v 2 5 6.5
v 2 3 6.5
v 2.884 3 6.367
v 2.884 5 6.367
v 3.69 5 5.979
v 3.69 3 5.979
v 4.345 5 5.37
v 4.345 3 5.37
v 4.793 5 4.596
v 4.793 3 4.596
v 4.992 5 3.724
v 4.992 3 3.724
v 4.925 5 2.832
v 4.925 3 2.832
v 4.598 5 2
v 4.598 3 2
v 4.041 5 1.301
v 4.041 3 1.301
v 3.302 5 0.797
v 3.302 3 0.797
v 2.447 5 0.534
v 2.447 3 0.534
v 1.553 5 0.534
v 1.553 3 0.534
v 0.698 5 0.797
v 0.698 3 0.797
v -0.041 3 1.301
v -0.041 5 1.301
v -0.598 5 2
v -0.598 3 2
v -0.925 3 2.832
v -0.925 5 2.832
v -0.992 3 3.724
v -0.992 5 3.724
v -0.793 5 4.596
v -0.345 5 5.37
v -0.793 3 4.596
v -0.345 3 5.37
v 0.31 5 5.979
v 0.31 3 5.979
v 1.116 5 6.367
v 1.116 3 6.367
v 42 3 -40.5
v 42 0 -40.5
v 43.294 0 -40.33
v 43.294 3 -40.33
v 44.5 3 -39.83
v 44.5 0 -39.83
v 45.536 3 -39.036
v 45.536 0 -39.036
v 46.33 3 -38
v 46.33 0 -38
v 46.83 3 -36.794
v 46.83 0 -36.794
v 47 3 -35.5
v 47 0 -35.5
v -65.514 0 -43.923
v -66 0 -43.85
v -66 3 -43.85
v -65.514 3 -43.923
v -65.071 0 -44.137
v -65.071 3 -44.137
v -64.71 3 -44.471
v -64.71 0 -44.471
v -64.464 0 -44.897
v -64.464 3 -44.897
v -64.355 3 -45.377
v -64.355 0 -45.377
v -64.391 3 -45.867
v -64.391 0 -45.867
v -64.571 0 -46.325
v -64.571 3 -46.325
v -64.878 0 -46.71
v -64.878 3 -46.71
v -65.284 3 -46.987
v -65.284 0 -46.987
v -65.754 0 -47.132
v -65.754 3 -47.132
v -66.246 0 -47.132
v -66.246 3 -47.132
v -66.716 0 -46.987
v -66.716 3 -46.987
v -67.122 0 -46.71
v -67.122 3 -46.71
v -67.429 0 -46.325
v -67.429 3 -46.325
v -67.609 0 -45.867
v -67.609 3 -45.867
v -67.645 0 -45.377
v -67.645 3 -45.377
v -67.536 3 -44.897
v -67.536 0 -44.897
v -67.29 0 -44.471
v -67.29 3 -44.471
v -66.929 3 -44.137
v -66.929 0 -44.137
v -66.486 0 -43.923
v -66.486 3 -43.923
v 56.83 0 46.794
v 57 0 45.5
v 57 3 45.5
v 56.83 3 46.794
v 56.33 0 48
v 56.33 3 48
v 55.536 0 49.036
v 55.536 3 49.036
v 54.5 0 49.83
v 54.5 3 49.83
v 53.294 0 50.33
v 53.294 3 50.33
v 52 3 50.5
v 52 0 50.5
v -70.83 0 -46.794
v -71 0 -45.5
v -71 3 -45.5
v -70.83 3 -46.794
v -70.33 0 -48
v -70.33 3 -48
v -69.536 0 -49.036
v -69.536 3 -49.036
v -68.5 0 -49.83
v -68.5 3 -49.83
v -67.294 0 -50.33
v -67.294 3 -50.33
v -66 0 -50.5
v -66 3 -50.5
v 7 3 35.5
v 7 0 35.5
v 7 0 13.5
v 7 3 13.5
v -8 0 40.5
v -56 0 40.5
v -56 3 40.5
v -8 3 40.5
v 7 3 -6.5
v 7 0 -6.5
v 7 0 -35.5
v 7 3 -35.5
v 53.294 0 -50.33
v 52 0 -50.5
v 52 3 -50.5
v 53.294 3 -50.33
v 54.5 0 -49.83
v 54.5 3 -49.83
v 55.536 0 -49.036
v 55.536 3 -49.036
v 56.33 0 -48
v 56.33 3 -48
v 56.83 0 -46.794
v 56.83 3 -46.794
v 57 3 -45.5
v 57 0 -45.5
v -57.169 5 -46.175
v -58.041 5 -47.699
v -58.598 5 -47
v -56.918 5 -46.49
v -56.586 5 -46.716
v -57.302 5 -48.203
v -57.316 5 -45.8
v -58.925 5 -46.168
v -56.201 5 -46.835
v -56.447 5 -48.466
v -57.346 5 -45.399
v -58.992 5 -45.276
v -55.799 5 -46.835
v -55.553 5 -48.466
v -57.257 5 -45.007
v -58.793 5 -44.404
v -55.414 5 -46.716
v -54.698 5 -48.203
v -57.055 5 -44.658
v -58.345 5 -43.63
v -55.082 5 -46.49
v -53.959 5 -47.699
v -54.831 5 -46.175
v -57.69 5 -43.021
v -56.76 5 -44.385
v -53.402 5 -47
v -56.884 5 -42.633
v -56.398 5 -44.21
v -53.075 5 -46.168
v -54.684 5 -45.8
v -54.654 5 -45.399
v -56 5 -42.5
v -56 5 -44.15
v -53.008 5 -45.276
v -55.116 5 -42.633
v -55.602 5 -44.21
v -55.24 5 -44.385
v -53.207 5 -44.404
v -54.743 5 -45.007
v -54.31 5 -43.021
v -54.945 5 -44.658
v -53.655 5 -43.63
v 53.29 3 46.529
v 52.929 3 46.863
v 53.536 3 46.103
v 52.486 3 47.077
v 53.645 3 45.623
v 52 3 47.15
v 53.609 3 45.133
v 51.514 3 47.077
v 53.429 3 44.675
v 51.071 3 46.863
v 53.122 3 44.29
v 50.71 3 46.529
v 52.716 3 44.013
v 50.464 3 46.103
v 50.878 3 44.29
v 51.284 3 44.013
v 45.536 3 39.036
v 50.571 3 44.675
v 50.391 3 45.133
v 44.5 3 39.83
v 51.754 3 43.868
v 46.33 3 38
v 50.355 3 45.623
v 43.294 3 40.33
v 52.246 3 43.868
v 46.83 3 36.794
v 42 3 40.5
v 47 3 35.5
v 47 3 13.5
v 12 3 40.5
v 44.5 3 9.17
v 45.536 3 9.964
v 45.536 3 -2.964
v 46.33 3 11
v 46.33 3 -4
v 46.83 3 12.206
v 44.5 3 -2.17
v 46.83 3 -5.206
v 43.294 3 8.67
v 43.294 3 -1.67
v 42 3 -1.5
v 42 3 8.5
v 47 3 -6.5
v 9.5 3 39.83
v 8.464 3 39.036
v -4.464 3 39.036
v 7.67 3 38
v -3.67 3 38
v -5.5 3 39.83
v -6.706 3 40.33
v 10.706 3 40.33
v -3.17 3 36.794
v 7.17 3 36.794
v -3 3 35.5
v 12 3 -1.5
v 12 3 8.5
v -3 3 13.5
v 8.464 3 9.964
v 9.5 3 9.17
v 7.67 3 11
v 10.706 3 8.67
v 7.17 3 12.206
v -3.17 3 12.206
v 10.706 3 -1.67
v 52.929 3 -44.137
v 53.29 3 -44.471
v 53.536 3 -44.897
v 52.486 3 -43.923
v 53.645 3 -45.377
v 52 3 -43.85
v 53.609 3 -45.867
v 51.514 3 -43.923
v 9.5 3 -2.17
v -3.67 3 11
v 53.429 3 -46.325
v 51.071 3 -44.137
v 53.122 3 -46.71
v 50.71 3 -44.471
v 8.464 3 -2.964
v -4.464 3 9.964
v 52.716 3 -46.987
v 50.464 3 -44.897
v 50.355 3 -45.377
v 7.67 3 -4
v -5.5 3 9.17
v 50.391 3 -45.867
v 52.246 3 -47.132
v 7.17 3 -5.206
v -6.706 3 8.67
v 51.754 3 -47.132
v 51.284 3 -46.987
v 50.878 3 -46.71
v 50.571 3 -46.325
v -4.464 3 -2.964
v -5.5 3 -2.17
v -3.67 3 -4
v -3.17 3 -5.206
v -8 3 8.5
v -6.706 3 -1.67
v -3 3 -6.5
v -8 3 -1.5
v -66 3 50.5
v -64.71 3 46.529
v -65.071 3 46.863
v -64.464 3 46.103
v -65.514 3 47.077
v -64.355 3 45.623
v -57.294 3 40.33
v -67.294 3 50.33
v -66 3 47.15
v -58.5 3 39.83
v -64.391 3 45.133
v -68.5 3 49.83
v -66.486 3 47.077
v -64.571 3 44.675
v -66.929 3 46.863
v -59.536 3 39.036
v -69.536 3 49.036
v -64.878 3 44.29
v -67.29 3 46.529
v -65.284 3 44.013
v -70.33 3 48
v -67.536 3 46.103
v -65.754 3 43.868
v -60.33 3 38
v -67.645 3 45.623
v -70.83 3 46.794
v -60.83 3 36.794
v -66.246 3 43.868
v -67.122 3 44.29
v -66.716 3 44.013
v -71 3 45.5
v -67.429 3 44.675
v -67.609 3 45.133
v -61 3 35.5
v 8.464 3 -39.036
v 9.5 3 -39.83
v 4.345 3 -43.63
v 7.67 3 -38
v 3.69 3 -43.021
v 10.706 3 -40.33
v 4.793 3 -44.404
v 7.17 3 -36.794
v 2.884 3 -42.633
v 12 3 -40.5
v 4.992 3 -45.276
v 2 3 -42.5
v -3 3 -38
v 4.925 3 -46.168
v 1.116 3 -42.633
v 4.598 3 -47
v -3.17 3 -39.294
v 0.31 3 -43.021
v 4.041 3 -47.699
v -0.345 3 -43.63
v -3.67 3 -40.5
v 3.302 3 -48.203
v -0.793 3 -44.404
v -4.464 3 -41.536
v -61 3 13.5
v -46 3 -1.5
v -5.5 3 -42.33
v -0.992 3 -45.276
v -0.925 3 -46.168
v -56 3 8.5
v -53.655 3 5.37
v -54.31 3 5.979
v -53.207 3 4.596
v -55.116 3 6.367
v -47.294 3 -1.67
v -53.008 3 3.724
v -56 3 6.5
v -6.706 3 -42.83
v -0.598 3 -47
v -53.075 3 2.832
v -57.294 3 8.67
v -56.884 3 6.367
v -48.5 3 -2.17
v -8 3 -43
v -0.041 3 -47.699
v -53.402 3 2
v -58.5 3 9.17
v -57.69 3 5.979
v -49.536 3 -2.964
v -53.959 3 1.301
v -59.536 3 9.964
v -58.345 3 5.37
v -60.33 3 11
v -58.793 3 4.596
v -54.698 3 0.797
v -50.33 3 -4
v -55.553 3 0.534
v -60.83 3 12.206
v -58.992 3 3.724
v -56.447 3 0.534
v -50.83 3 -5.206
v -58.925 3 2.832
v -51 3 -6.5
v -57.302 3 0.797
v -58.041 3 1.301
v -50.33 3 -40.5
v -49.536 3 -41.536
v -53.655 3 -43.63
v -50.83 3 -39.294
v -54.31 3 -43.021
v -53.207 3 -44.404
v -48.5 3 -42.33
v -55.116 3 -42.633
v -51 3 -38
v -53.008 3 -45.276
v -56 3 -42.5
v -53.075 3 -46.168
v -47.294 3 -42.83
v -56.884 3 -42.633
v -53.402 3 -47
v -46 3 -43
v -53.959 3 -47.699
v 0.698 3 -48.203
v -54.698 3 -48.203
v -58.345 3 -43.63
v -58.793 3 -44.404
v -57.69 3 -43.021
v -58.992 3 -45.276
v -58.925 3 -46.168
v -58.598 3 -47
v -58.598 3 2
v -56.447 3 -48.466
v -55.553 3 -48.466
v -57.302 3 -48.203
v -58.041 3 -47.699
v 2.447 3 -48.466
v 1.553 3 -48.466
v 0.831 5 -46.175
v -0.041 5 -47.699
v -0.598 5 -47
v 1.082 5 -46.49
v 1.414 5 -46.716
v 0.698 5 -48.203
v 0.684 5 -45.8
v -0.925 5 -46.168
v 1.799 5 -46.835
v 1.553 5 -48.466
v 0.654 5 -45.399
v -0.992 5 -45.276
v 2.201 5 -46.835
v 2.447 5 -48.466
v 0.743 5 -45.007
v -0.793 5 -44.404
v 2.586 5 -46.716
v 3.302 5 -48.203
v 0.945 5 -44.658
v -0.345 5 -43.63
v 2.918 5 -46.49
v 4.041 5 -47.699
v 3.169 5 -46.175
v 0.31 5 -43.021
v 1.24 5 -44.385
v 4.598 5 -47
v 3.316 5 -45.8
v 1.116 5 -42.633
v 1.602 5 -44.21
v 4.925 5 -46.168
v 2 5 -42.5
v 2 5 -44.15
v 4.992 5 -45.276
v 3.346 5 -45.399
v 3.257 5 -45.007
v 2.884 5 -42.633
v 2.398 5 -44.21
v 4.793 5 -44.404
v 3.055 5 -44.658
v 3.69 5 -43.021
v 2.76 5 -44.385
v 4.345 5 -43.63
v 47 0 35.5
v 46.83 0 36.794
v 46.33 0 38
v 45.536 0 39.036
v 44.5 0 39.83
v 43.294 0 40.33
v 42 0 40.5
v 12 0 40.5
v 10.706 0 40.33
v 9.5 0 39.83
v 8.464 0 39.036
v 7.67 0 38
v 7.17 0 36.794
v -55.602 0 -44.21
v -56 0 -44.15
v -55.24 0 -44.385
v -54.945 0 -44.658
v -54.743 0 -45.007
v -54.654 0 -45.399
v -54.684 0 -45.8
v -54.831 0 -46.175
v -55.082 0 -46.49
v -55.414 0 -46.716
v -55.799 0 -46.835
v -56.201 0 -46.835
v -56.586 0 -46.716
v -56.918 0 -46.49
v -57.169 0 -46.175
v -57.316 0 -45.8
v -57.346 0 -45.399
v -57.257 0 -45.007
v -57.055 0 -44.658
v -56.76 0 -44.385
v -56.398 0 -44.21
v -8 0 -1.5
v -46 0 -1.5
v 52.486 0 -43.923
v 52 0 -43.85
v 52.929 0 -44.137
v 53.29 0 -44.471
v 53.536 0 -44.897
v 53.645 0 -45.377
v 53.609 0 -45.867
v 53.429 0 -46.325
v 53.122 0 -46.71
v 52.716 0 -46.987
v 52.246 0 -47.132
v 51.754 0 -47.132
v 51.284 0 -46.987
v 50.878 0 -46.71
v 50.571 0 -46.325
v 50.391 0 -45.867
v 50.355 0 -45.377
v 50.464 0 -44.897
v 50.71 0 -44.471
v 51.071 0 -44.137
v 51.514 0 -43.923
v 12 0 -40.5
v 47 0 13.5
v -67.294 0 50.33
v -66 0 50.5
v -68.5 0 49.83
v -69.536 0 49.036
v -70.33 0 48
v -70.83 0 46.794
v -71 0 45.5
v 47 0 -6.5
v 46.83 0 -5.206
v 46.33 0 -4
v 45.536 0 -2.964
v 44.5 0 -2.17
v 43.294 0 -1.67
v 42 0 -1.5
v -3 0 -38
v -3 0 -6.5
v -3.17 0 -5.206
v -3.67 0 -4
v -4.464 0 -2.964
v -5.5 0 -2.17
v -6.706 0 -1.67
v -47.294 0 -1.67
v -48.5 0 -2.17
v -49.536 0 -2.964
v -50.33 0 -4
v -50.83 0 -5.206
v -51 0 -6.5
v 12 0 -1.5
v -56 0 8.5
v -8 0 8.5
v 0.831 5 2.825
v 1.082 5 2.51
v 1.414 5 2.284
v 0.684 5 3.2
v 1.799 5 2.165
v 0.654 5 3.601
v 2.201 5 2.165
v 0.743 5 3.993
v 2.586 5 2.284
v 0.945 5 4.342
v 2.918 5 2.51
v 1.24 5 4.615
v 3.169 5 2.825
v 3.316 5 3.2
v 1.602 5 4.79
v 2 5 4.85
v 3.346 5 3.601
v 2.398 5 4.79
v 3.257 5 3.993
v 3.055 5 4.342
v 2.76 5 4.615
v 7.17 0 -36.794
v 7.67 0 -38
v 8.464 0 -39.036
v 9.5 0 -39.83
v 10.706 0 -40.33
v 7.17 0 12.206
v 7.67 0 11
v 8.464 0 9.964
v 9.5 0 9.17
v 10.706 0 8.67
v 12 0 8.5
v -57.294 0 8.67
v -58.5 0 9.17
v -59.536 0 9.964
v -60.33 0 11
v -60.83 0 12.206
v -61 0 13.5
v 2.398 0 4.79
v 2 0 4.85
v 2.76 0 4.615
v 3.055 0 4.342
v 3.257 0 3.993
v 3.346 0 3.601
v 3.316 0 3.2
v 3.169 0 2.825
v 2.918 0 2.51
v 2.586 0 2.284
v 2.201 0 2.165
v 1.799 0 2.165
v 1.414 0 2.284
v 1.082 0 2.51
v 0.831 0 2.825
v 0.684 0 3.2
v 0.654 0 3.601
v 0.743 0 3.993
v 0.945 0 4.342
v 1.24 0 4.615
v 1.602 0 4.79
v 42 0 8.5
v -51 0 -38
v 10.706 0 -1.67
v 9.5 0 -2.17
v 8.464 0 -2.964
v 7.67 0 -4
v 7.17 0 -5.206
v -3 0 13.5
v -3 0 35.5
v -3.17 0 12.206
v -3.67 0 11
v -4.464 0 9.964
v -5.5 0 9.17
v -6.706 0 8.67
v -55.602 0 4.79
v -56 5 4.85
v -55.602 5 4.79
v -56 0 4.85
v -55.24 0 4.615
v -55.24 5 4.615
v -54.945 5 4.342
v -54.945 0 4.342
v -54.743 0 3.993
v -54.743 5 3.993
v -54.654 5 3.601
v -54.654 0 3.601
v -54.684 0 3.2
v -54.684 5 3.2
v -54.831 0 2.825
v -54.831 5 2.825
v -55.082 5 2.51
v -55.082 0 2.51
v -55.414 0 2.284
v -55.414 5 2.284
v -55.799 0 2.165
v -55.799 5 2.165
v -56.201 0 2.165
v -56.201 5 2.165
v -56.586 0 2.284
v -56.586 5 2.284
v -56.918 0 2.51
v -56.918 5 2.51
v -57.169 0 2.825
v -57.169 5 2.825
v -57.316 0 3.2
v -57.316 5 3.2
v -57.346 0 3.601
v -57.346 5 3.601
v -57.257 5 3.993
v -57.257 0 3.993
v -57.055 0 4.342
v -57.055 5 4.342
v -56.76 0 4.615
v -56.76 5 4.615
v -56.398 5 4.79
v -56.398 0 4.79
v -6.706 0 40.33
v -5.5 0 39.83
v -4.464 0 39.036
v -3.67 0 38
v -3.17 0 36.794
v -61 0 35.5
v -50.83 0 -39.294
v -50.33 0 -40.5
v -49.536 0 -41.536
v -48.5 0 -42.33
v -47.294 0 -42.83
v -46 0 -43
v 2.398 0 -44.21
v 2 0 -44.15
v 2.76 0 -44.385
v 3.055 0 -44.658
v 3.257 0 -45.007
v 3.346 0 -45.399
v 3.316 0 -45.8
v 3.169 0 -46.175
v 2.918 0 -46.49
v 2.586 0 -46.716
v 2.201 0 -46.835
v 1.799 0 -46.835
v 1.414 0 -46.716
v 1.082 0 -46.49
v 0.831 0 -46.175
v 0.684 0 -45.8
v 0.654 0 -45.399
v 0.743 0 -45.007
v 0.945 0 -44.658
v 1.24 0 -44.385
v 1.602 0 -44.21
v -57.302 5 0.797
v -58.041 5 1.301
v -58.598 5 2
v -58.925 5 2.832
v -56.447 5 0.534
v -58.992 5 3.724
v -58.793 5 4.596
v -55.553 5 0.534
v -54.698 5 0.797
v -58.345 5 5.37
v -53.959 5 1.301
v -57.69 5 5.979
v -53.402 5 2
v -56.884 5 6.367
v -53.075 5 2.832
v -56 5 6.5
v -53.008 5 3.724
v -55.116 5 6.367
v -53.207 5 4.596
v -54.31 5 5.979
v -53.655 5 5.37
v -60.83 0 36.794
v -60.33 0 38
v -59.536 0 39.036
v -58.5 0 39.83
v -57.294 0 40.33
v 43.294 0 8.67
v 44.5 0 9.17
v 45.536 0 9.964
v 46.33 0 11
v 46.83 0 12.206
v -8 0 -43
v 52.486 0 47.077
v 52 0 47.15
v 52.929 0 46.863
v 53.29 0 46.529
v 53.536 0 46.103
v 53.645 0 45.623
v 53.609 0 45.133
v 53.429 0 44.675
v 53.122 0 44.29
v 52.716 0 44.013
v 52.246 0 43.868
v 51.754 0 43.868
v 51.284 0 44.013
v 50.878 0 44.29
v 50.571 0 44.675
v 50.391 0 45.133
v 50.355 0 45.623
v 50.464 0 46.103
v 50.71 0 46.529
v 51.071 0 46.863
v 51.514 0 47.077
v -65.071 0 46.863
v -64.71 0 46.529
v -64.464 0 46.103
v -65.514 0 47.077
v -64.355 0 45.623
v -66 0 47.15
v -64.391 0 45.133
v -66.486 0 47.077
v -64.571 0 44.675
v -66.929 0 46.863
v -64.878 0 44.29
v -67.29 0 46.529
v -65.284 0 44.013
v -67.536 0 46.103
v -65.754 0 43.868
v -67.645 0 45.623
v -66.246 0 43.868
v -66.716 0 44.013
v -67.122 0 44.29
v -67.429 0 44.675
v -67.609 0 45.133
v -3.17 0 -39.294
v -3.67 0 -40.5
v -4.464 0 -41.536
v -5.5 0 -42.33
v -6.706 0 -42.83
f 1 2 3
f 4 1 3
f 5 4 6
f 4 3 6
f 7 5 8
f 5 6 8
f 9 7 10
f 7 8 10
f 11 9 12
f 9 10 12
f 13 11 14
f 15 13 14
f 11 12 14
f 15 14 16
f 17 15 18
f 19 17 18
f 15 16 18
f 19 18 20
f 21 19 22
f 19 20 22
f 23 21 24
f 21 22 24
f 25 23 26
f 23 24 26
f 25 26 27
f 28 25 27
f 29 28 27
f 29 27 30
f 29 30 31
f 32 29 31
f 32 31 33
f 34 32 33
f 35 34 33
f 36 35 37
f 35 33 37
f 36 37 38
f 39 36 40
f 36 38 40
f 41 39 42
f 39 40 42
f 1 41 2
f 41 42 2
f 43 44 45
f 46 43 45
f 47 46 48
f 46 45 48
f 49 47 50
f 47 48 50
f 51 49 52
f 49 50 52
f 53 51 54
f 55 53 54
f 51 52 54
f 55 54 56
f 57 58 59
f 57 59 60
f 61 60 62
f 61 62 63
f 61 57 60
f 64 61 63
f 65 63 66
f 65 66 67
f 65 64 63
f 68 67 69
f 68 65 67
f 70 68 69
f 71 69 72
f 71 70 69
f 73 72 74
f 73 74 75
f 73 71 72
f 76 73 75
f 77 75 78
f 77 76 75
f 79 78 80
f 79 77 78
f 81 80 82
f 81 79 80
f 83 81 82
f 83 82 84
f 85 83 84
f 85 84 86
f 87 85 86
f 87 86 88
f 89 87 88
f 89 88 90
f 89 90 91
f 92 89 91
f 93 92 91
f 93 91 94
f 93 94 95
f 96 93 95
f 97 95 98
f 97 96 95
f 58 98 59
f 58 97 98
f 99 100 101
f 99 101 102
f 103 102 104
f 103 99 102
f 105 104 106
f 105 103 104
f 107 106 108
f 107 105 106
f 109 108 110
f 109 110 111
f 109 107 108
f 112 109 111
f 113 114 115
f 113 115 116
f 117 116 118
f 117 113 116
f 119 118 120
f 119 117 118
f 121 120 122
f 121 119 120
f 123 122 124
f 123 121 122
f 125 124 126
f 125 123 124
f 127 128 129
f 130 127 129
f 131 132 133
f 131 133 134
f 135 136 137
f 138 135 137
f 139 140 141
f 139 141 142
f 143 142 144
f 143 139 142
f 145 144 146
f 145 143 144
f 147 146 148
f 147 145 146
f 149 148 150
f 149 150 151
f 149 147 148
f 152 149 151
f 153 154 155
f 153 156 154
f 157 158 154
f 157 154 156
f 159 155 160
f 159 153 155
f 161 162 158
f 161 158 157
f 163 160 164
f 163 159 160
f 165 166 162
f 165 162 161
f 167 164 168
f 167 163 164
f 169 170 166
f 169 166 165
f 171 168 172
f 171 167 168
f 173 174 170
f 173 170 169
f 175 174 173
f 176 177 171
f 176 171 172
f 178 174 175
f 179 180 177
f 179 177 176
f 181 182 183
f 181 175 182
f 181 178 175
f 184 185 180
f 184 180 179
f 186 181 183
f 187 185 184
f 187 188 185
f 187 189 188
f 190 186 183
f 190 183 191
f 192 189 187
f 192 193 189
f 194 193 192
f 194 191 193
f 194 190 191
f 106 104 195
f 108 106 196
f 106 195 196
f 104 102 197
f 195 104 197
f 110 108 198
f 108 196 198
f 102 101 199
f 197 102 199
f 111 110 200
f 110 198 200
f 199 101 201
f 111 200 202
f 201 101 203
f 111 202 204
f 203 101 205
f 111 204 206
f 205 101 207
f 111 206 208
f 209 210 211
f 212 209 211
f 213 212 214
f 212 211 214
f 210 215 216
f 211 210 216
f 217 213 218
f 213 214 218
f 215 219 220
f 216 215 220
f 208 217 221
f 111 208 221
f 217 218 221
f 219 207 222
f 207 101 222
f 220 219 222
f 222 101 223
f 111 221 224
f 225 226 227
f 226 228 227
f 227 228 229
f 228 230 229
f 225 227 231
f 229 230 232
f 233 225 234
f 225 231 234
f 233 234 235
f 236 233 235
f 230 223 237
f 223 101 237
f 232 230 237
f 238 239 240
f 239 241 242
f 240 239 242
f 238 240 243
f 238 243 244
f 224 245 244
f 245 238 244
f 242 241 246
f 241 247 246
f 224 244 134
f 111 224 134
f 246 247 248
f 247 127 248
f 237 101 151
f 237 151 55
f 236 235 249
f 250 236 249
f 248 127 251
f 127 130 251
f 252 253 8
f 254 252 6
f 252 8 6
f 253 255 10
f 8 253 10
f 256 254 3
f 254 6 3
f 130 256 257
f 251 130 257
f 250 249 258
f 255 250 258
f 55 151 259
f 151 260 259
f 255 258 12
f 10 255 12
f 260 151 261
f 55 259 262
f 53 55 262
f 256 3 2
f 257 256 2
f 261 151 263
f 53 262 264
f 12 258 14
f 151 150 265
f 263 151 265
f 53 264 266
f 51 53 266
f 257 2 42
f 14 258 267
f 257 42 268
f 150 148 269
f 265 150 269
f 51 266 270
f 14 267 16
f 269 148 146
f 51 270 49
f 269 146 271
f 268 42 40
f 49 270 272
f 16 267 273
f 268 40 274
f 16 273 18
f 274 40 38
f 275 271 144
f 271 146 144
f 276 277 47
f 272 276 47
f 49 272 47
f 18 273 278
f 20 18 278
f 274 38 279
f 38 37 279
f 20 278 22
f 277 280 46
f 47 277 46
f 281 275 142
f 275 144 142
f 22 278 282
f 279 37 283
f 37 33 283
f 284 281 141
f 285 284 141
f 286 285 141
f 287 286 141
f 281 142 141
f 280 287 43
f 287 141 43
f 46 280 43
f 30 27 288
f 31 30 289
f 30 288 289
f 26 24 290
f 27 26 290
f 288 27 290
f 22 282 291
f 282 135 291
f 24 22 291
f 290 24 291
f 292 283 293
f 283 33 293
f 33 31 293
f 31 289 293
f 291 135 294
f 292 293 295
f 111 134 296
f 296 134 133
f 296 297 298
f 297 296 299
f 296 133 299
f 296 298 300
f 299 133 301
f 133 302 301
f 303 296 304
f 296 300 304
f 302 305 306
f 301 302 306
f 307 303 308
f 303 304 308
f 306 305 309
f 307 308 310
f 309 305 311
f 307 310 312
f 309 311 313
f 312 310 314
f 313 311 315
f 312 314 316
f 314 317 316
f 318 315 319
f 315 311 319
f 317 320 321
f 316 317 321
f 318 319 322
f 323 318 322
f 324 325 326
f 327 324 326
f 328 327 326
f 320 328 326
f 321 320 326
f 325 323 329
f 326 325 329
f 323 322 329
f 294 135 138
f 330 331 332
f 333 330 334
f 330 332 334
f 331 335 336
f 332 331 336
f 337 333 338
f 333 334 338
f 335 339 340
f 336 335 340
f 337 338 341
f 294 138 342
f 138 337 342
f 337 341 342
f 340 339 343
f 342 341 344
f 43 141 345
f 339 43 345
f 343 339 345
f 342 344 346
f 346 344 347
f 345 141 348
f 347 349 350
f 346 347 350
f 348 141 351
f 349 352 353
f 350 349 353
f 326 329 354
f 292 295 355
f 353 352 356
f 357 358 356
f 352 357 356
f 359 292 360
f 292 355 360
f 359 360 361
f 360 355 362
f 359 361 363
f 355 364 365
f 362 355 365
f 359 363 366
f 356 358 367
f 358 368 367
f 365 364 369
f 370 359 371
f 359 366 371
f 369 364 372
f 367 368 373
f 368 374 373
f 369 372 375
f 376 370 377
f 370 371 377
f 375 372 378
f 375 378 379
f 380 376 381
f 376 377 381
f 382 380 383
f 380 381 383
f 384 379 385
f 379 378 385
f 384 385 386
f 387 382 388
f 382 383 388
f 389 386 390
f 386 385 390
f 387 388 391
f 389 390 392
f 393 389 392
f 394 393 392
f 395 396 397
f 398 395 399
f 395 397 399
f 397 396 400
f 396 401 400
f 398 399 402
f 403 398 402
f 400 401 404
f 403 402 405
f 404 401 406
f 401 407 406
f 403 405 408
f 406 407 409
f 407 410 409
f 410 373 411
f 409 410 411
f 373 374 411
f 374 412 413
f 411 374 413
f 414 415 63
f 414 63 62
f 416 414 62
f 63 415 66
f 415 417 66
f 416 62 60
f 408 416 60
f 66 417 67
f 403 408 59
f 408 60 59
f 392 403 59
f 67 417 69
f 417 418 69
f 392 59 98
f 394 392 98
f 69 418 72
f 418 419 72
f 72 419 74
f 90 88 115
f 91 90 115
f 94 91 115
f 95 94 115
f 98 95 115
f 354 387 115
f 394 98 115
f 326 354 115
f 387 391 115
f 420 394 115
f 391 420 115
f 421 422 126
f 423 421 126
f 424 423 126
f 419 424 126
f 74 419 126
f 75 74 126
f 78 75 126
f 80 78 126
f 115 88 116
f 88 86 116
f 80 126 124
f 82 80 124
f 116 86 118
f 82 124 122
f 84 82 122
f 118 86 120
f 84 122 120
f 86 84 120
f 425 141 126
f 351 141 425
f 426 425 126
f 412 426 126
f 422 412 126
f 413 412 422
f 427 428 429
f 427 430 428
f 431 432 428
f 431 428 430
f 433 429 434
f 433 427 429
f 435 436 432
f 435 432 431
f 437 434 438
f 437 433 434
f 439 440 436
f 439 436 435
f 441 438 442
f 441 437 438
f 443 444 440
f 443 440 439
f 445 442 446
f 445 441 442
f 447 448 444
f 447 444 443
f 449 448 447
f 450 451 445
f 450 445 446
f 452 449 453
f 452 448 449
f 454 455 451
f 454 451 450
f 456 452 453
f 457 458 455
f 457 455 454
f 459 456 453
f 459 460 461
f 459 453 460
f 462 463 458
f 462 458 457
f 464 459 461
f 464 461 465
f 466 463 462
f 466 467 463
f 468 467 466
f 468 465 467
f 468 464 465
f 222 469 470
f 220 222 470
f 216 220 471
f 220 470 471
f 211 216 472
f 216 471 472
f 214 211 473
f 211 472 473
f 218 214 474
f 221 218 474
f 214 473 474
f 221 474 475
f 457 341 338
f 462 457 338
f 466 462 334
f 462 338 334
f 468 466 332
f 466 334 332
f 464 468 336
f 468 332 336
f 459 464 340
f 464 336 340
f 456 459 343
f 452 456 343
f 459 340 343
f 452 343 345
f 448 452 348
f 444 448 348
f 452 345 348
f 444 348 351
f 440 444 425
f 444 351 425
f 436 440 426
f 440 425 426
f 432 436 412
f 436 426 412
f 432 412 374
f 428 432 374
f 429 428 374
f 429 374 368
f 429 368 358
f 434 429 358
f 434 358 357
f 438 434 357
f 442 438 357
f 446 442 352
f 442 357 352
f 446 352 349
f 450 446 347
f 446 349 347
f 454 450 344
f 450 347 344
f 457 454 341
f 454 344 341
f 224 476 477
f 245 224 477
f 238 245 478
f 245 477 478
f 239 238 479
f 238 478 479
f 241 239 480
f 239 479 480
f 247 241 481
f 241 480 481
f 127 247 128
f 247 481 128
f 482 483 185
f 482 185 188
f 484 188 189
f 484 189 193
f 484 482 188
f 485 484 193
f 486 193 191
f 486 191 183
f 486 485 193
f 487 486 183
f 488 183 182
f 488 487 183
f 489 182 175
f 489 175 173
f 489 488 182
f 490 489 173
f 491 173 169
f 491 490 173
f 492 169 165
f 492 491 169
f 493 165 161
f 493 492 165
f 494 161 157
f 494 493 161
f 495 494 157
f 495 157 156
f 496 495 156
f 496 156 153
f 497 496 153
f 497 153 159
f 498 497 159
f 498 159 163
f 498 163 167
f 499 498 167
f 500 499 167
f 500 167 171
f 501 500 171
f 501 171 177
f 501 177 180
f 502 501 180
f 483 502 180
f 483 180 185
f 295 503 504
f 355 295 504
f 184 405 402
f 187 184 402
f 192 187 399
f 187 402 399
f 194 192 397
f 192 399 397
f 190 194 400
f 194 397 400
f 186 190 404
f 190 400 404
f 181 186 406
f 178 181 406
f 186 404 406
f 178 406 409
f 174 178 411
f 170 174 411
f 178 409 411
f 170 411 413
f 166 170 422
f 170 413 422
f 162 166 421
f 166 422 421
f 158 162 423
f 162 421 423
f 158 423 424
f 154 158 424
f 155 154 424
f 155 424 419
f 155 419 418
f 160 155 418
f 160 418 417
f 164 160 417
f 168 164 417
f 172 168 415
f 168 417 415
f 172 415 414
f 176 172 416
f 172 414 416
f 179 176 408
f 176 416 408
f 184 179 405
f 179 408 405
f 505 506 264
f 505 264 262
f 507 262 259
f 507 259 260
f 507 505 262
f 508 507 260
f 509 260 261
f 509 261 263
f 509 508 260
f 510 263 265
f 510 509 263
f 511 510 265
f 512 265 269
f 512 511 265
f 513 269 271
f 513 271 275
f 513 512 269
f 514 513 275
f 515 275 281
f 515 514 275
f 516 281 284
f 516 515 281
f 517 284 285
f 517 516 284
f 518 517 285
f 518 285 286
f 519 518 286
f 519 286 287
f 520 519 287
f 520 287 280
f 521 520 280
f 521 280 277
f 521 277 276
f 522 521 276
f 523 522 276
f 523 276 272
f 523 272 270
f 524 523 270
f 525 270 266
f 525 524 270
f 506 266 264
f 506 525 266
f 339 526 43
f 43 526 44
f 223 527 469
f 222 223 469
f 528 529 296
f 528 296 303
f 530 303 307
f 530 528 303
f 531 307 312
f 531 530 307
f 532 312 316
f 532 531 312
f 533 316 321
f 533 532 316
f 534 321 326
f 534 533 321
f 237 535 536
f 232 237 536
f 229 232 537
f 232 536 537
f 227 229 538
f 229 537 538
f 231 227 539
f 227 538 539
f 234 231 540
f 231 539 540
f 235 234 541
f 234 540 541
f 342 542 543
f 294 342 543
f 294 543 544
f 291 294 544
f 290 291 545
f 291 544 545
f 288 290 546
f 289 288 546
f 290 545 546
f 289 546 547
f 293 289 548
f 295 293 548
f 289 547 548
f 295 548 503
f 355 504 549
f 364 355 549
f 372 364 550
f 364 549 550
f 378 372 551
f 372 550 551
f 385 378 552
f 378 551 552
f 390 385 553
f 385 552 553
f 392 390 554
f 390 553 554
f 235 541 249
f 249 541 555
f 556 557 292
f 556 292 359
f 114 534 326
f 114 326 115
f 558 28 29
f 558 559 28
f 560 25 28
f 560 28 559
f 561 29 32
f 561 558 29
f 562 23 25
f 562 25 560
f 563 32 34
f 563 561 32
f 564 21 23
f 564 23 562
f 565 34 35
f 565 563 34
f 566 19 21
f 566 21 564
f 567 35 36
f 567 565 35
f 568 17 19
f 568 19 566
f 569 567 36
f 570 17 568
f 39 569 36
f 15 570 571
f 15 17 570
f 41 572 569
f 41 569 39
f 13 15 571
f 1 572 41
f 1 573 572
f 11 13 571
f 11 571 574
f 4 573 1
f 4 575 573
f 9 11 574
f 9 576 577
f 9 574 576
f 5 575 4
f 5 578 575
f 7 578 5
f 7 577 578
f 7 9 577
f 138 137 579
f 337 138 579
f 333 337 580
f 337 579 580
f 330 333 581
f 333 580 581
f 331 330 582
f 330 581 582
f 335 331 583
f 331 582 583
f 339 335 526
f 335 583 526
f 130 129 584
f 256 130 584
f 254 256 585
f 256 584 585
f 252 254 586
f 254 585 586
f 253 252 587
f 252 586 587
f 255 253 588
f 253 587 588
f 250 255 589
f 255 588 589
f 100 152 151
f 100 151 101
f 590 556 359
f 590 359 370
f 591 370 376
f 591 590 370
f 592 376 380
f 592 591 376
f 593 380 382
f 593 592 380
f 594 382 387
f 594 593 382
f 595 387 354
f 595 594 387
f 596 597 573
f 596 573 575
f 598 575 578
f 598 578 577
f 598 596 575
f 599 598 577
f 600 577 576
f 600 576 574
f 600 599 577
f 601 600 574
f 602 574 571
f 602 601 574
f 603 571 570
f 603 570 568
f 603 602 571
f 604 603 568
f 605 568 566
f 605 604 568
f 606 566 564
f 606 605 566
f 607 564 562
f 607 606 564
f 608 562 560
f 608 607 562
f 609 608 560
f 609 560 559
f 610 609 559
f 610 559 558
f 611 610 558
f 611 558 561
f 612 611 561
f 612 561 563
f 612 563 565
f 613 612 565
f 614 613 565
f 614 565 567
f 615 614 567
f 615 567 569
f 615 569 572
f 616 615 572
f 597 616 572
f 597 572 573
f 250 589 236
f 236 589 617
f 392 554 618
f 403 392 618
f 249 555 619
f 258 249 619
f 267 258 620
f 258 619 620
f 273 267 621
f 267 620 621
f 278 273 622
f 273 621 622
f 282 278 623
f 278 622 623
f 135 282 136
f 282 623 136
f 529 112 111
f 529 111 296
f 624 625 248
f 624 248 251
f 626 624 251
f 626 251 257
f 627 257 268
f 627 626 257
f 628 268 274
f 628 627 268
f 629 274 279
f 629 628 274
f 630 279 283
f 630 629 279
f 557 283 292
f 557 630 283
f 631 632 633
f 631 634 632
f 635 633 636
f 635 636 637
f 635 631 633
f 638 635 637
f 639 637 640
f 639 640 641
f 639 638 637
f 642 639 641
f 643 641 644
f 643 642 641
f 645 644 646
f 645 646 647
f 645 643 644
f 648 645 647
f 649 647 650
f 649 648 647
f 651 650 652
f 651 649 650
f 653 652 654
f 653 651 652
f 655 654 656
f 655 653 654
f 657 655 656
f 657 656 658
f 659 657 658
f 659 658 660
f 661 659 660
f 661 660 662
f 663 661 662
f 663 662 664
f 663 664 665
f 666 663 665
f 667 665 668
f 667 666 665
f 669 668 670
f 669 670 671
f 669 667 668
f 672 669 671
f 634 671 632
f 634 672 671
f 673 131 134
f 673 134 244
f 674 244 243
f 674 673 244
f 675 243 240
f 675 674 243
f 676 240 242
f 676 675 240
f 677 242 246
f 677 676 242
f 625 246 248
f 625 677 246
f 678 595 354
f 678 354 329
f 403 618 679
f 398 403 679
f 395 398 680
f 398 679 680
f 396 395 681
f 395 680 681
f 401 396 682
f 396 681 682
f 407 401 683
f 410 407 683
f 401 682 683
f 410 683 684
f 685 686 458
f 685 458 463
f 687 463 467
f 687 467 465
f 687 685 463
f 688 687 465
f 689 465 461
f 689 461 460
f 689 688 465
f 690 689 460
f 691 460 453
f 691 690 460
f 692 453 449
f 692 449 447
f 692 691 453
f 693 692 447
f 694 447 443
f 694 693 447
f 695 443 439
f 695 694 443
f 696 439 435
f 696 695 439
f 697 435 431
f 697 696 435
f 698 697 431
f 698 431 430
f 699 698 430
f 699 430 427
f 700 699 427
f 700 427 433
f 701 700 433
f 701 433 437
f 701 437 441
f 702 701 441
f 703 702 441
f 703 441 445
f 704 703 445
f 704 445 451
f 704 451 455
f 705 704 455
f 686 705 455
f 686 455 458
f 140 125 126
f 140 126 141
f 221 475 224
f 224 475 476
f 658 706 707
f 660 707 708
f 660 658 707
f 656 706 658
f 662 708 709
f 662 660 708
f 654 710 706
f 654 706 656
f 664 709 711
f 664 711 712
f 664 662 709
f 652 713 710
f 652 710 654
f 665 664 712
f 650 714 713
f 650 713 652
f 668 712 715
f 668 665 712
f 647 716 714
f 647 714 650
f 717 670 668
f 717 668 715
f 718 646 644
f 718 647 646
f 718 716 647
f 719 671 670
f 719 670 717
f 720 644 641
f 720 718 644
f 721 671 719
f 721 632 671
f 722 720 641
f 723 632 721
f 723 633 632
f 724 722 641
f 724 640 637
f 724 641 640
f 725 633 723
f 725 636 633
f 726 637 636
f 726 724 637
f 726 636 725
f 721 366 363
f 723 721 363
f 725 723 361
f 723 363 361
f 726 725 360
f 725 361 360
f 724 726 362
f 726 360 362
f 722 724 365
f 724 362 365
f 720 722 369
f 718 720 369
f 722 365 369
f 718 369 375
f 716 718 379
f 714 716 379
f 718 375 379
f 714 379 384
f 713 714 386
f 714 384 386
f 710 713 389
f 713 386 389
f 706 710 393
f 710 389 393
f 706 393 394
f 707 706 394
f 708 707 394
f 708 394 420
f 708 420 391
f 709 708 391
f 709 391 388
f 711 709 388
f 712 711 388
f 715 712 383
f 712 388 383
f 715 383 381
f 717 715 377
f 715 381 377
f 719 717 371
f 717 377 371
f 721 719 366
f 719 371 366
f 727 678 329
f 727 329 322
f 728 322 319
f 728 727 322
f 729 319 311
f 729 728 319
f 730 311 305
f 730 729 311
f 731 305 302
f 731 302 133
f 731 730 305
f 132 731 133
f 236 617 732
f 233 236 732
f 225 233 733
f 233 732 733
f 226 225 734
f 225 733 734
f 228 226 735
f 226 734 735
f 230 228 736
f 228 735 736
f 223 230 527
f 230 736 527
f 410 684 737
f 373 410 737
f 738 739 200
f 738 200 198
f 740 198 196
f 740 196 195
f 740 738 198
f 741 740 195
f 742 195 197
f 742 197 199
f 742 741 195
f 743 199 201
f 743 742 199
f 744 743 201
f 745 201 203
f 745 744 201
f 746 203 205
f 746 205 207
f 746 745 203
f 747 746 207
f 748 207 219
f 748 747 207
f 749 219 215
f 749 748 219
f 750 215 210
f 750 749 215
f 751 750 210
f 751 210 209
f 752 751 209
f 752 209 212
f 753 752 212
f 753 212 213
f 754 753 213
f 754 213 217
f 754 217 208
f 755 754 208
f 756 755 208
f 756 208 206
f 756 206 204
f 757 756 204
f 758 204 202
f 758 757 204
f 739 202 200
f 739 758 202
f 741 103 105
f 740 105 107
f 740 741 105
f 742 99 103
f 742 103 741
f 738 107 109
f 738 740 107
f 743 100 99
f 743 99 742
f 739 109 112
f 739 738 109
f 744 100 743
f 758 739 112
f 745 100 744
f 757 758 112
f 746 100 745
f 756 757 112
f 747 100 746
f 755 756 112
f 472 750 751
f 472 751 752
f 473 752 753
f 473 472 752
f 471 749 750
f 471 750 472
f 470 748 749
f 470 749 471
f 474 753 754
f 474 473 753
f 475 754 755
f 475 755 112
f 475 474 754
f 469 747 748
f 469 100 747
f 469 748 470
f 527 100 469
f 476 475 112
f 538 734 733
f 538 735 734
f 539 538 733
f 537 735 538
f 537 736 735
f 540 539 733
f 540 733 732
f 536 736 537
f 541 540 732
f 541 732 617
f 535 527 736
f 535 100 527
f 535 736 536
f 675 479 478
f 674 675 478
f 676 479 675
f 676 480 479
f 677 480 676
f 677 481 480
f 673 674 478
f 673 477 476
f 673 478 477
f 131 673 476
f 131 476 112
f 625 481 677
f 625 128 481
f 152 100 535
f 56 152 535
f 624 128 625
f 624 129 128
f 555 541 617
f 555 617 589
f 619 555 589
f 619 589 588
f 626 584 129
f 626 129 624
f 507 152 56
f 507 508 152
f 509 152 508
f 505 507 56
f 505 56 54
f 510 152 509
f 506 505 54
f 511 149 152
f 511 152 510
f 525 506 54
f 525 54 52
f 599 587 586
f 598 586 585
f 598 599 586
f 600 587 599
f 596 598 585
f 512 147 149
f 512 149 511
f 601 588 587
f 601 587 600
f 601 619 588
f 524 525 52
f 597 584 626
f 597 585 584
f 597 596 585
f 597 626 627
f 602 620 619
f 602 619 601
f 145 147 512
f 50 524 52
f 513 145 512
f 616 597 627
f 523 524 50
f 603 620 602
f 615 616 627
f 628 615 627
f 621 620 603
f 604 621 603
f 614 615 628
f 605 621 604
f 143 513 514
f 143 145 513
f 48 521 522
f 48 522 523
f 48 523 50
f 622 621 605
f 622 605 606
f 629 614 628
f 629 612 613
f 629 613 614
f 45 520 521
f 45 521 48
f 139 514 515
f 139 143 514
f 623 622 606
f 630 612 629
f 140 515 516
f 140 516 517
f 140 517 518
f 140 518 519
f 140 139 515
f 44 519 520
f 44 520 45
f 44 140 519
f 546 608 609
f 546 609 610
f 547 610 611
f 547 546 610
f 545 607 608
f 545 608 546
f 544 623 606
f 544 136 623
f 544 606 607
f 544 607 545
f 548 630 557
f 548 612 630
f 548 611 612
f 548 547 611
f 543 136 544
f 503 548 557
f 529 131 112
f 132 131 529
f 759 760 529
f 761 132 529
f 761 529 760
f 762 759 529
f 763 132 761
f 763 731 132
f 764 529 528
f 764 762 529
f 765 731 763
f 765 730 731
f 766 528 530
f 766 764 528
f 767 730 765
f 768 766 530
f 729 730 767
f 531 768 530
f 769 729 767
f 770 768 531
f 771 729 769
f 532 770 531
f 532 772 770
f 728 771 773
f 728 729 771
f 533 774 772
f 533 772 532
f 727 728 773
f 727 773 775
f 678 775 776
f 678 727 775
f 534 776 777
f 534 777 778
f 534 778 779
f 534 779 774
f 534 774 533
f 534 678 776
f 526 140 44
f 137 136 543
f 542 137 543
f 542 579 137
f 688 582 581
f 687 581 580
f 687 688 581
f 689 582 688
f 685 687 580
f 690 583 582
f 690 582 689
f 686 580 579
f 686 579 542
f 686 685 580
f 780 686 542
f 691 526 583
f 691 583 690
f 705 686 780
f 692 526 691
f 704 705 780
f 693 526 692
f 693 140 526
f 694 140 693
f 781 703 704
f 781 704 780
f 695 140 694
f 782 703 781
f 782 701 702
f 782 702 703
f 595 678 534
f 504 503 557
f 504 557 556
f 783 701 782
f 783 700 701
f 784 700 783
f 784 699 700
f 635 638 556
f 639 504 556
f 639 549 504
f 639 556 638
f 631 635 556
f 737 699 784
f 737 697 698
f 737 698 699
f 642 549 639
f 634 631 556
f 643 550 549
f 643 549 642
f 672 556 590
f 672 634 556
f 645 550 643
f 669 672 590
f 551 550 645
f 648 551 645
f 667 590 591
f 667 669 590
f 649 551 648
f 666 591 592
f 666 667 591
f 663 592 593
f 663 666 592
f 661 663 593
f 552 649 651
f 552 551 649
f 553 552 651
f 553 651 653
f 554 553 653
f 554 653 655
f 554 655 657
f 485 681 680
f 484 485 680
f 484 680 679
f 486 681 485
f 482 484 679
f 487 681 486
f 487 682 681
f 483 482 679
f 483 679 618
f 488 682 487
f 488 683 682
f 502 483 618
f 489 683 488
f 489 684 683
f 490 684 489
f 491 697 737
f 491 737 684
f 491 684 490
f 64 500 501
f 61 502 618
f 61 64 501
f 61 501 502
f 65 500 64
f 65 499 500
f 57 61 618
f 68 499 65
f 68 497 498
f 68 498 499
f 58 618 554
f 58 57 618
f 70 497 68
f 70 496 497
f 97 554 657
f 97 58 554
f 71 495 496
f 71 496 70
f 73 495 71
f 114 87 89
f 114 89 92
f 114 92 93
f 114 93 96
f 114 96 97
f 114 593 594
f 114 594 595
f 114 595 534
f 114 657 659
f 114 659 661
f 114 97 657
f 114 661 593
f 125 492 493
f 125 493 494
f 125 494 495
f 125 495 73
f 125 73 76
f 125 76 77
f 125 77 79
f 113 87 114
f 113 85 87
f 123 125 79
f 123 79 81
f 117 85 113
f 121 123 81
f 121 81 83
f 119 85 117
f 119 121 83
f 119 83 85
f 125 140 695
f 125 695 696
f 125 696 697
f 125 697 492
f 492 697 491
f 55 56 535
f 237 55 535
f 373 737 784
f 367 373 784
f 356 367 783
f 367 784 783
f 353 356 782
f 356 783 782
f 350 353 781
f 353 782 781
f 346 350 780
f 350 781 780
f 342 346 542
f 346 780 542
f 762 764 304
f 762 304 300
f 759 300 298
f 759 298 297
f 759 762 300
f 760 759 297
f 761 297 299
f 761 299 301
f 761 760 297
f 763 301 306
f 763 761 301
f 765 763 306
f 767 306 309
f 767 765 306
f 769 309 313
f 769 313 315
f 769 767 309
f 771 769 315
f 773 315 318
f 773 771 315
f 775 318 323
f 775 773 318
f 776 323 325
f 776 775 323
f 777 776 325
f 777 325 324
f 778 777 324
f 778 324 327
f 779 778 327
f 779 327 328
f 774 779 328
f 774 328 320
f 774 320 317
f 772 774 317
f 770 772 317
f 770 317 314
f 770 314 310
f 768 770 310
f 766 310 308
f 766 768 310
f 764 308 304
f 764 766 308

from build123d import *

# Parameters (mm, degrees)
SKETCH2_R           = 1.65
SKETCH2_R_2         = 1.35
BOSS_EXTRUDE1_DEPTH = 3
SKETCH3_R           = 3
SKETCH3_R_2         = 1.35
BOSS_EXTRUDE2_DEPTH = 2


with BuildPart() as part:
    # Sketch2 → Boss-Extrude1 (new body)
    with BuildSketch(Plane(origin=(0, 0, 0), x_dir=(1, 0, 0), z_dir=(0, 1, 0))):
        with BuildLine():
            Line((-66, 50.5), (52, 50.5))
            ThreePointArc((52, 50.5), (55.535533906, 49.035533906), (57, 45.5))
            Line((57, 45.5), (57, -45.5))
            ThreePointArc((57, -45.5), (55.535533906, -49.035533906), (52, -50.5))
            Line((52, -50.5), (-66, -50.5))
            ThreePointArc((-66, -50.5), (-69.535533906, -49.035533906), (-71, -45.5))
            Line((-71, -45.5), (-71, 45.5))
            ThreePointArc((-71, 45.5), (-69.535533906, 49.035533906), (-66, 50.5))
        make_face()
        with Locations(Location((52, 45.5, 0), (0, 0, 270))):
            Circle(SKETCH2_R, mode=Mode.SUBTRACT)
        with Locations(Location((52, -45.5, 0), (0, 0, 270))):
            Circle(SKETCH2_R, mode=Mode.SUBTRACT)
        with Locations(Location((-66, -45.5, 0), (0, 0, 270))):
            Circle(SKETCH2_R, mode=Mode.SUBTRACT)
        with Locations(Location((-66, 45.5, 0), (0, 0, 270))):
            Circle(SKETCH2_R, mode=Mode.SUBTRACT)
        with Locations(Location((-56, -3.5, 0), (0, 0, 270))):
            Circle(SKETCH2_R_2, mode=Mode.SUBTRACT)
        with Locations(Location((-56, 45.5, 0), (0, 0, 270))):
            Circle(SKETCH2_R_2, mode=Mode.SUBTRACT)
        with Locations(Location((2, 45.5, 0), (0, 0, 270))):
            Circle(SKETCH2_R_2, mode=Mode.SUBTRACT)
        with Locations(Location((2, -3.5, 0), (0, 0, 270))):
            Circle(SKETCH2_R_2, mode=Mode.SUBTRACT)
        with BuildLine():
            Line((12, 40.5), (42, 40.5))
            ThreePointArc((42, 40.5), (45.535533906, 39.035533906), (47, 35.5))
            Line((47, 35.5), (47, 6.5))
            ThreePointArc((47, 6.5), (45.535533906, 2.964466094), (42, 1.5))
            Line((42, 1.5), (12, 1.5))
            ThreePointArc((12, 1.5), (8.464466094, 2.964466094), (7, 6.5))
            Line((7, 6.5), (7, 35.5))
            ThreePointArc((7, 35.5), (8.464466094, 39.035533906), (12, 40.5))
        make_face(mode=Mode.SUBTRACT)
        with BuildLine():
            Line((12, -8.5), (42, -8.5))
            ThreePointArc((42, -8.5), (45.535533906, -9.964466094), (47, -13.5))
            Line((47, -13.5), (47, -35.5))
            ThreePointArc((47, -35.5), (45.535533906, -39.035533906), (42, -40.5))
            Line((42, -40.5), (12, -40.5))
            ThreePointArc((12, -40.5), (8.464466094, -39.035533906), (7, -35.5))
            Line((7, -35.5), (7, -13.5))
            ThreePointArc((7, -13.5), (8.464466094, -9.964466094), (12, -8.5))
        make_face(mode=Mode.SUBTRACT)
        with BuildLine():
            Line((-8, -8.5), (-56, -8.5))
            ThreePointArc((-56, -8.5), (-59.535533906, -9.964466094), (-61, -13.5))
            Line((-61, -13.5), (-61, -35.5))
            ThreePointArc((-61, -35.5), (-59.535533906, -39.035533906), (-56, -40.5))
            Line((-56, -40.5), (-8, -40.5))
            ThreePointArc((-8, -40.5), (-4.464466094, -39.035533906), (-3, -35.5))
            Line((-3, -35.5), (-3, -13.5))
            ThreePointArc((-3, -13.5), (-4.464466094, -9.964466094), (-8, -8.5))
        make_face(mode=Mode.SUBTRACT)
        with BuildLine():
            Line((-46, 43), (-8, 43))
            ThreePointArc((-8, 43), (-4.464466094, 41.535533906), (-3, 38))
            Line((-3, 38), (-3, 6.5))
            ThreePointArc((-3, 6.5), (-4.464466094, 2.964466094), (-8, 1.5))
            Line((-8, 1.5), (-46, 1.5))
            ThreePointArc((-46, 1.5), (-49.535533906, 2.964466094), (-51, 6.5))
            Line((-51, 6.5), (-51, 38))
            ThreePointArc((-51, 38), (-49.535533906, 41.535533906), (-46, 43))
        make_face(mode=Mode.SUBTRACT)
    extrude(amount=BOSS_EXTRUDE1_DEPTH)

    # Sketch3 → Boss-Extrude2 (add)
    # profile 1 of 4: a face of its own
    with BuildSketch(Plane(origin=(0, 3, 0), x_dir=(1, 0, 0), z_dir=(0, 1, 0))):
        with Locations(Location((-56, -3.5, 0), (0, 0, 270))):
            Circle(SKETCH3_R)
        with Locations(Location((-56, -3.5, 0), (0, 0, 270))):
            Circle(SKETCH3_R_2, mode=Mode.SUBTRACT)
    # profile 2 of 4: a face of its own
    with BuildSketch(Plane(origin=(0, 3, 0), x_dir=(1, 0, 0), z_dir=(0, 1, 0))):
        with Locations(Location((2, -3.5, 0), (0, 0, 270))):
            Circle(SKETCH3_R)
        with Locations(Location((2, -3.5, 0), (0, 0, 270))):
            Circle(SKETCH3_R_2, mode=Mode.SUBTRACT)
    # profile 3 of 4: a face of its own
    with BuildSketch(Plane(origin=(0, 3, 0), x_dir=(1, 0, 0), z_dir=(0, 1, 0))):
        with Locations(Location((2, 45.5, 0), (0, 0, 270))):
            Circle(SKETCH3_R)
        with Locations(Location((2, 45.5, 0), (0, 0, 270))):
            Circle(SKETCH3_R_2, mode=Mode.SUBTRACT)
    # profile 4 of 4: a face of its own
    with BuildSketch(Plane(origin=(0, 3, 0), x_dir=(1, 0, 0), z_dir=(0, 1, 0))):
        with Locations(Location((-56, 45.5, 0), (0, 0, 270))):
            Circle(SKETCH3_R)
        with Locations(Location((-56, 45.5, 0), (0, 0, 270))):
            Circle(SKETCH3_R_2, mode=Mode.SUBTRACT)
    extrude(amount=BOSS_EXTRUDE2_DEPTH)


solid = part.part
